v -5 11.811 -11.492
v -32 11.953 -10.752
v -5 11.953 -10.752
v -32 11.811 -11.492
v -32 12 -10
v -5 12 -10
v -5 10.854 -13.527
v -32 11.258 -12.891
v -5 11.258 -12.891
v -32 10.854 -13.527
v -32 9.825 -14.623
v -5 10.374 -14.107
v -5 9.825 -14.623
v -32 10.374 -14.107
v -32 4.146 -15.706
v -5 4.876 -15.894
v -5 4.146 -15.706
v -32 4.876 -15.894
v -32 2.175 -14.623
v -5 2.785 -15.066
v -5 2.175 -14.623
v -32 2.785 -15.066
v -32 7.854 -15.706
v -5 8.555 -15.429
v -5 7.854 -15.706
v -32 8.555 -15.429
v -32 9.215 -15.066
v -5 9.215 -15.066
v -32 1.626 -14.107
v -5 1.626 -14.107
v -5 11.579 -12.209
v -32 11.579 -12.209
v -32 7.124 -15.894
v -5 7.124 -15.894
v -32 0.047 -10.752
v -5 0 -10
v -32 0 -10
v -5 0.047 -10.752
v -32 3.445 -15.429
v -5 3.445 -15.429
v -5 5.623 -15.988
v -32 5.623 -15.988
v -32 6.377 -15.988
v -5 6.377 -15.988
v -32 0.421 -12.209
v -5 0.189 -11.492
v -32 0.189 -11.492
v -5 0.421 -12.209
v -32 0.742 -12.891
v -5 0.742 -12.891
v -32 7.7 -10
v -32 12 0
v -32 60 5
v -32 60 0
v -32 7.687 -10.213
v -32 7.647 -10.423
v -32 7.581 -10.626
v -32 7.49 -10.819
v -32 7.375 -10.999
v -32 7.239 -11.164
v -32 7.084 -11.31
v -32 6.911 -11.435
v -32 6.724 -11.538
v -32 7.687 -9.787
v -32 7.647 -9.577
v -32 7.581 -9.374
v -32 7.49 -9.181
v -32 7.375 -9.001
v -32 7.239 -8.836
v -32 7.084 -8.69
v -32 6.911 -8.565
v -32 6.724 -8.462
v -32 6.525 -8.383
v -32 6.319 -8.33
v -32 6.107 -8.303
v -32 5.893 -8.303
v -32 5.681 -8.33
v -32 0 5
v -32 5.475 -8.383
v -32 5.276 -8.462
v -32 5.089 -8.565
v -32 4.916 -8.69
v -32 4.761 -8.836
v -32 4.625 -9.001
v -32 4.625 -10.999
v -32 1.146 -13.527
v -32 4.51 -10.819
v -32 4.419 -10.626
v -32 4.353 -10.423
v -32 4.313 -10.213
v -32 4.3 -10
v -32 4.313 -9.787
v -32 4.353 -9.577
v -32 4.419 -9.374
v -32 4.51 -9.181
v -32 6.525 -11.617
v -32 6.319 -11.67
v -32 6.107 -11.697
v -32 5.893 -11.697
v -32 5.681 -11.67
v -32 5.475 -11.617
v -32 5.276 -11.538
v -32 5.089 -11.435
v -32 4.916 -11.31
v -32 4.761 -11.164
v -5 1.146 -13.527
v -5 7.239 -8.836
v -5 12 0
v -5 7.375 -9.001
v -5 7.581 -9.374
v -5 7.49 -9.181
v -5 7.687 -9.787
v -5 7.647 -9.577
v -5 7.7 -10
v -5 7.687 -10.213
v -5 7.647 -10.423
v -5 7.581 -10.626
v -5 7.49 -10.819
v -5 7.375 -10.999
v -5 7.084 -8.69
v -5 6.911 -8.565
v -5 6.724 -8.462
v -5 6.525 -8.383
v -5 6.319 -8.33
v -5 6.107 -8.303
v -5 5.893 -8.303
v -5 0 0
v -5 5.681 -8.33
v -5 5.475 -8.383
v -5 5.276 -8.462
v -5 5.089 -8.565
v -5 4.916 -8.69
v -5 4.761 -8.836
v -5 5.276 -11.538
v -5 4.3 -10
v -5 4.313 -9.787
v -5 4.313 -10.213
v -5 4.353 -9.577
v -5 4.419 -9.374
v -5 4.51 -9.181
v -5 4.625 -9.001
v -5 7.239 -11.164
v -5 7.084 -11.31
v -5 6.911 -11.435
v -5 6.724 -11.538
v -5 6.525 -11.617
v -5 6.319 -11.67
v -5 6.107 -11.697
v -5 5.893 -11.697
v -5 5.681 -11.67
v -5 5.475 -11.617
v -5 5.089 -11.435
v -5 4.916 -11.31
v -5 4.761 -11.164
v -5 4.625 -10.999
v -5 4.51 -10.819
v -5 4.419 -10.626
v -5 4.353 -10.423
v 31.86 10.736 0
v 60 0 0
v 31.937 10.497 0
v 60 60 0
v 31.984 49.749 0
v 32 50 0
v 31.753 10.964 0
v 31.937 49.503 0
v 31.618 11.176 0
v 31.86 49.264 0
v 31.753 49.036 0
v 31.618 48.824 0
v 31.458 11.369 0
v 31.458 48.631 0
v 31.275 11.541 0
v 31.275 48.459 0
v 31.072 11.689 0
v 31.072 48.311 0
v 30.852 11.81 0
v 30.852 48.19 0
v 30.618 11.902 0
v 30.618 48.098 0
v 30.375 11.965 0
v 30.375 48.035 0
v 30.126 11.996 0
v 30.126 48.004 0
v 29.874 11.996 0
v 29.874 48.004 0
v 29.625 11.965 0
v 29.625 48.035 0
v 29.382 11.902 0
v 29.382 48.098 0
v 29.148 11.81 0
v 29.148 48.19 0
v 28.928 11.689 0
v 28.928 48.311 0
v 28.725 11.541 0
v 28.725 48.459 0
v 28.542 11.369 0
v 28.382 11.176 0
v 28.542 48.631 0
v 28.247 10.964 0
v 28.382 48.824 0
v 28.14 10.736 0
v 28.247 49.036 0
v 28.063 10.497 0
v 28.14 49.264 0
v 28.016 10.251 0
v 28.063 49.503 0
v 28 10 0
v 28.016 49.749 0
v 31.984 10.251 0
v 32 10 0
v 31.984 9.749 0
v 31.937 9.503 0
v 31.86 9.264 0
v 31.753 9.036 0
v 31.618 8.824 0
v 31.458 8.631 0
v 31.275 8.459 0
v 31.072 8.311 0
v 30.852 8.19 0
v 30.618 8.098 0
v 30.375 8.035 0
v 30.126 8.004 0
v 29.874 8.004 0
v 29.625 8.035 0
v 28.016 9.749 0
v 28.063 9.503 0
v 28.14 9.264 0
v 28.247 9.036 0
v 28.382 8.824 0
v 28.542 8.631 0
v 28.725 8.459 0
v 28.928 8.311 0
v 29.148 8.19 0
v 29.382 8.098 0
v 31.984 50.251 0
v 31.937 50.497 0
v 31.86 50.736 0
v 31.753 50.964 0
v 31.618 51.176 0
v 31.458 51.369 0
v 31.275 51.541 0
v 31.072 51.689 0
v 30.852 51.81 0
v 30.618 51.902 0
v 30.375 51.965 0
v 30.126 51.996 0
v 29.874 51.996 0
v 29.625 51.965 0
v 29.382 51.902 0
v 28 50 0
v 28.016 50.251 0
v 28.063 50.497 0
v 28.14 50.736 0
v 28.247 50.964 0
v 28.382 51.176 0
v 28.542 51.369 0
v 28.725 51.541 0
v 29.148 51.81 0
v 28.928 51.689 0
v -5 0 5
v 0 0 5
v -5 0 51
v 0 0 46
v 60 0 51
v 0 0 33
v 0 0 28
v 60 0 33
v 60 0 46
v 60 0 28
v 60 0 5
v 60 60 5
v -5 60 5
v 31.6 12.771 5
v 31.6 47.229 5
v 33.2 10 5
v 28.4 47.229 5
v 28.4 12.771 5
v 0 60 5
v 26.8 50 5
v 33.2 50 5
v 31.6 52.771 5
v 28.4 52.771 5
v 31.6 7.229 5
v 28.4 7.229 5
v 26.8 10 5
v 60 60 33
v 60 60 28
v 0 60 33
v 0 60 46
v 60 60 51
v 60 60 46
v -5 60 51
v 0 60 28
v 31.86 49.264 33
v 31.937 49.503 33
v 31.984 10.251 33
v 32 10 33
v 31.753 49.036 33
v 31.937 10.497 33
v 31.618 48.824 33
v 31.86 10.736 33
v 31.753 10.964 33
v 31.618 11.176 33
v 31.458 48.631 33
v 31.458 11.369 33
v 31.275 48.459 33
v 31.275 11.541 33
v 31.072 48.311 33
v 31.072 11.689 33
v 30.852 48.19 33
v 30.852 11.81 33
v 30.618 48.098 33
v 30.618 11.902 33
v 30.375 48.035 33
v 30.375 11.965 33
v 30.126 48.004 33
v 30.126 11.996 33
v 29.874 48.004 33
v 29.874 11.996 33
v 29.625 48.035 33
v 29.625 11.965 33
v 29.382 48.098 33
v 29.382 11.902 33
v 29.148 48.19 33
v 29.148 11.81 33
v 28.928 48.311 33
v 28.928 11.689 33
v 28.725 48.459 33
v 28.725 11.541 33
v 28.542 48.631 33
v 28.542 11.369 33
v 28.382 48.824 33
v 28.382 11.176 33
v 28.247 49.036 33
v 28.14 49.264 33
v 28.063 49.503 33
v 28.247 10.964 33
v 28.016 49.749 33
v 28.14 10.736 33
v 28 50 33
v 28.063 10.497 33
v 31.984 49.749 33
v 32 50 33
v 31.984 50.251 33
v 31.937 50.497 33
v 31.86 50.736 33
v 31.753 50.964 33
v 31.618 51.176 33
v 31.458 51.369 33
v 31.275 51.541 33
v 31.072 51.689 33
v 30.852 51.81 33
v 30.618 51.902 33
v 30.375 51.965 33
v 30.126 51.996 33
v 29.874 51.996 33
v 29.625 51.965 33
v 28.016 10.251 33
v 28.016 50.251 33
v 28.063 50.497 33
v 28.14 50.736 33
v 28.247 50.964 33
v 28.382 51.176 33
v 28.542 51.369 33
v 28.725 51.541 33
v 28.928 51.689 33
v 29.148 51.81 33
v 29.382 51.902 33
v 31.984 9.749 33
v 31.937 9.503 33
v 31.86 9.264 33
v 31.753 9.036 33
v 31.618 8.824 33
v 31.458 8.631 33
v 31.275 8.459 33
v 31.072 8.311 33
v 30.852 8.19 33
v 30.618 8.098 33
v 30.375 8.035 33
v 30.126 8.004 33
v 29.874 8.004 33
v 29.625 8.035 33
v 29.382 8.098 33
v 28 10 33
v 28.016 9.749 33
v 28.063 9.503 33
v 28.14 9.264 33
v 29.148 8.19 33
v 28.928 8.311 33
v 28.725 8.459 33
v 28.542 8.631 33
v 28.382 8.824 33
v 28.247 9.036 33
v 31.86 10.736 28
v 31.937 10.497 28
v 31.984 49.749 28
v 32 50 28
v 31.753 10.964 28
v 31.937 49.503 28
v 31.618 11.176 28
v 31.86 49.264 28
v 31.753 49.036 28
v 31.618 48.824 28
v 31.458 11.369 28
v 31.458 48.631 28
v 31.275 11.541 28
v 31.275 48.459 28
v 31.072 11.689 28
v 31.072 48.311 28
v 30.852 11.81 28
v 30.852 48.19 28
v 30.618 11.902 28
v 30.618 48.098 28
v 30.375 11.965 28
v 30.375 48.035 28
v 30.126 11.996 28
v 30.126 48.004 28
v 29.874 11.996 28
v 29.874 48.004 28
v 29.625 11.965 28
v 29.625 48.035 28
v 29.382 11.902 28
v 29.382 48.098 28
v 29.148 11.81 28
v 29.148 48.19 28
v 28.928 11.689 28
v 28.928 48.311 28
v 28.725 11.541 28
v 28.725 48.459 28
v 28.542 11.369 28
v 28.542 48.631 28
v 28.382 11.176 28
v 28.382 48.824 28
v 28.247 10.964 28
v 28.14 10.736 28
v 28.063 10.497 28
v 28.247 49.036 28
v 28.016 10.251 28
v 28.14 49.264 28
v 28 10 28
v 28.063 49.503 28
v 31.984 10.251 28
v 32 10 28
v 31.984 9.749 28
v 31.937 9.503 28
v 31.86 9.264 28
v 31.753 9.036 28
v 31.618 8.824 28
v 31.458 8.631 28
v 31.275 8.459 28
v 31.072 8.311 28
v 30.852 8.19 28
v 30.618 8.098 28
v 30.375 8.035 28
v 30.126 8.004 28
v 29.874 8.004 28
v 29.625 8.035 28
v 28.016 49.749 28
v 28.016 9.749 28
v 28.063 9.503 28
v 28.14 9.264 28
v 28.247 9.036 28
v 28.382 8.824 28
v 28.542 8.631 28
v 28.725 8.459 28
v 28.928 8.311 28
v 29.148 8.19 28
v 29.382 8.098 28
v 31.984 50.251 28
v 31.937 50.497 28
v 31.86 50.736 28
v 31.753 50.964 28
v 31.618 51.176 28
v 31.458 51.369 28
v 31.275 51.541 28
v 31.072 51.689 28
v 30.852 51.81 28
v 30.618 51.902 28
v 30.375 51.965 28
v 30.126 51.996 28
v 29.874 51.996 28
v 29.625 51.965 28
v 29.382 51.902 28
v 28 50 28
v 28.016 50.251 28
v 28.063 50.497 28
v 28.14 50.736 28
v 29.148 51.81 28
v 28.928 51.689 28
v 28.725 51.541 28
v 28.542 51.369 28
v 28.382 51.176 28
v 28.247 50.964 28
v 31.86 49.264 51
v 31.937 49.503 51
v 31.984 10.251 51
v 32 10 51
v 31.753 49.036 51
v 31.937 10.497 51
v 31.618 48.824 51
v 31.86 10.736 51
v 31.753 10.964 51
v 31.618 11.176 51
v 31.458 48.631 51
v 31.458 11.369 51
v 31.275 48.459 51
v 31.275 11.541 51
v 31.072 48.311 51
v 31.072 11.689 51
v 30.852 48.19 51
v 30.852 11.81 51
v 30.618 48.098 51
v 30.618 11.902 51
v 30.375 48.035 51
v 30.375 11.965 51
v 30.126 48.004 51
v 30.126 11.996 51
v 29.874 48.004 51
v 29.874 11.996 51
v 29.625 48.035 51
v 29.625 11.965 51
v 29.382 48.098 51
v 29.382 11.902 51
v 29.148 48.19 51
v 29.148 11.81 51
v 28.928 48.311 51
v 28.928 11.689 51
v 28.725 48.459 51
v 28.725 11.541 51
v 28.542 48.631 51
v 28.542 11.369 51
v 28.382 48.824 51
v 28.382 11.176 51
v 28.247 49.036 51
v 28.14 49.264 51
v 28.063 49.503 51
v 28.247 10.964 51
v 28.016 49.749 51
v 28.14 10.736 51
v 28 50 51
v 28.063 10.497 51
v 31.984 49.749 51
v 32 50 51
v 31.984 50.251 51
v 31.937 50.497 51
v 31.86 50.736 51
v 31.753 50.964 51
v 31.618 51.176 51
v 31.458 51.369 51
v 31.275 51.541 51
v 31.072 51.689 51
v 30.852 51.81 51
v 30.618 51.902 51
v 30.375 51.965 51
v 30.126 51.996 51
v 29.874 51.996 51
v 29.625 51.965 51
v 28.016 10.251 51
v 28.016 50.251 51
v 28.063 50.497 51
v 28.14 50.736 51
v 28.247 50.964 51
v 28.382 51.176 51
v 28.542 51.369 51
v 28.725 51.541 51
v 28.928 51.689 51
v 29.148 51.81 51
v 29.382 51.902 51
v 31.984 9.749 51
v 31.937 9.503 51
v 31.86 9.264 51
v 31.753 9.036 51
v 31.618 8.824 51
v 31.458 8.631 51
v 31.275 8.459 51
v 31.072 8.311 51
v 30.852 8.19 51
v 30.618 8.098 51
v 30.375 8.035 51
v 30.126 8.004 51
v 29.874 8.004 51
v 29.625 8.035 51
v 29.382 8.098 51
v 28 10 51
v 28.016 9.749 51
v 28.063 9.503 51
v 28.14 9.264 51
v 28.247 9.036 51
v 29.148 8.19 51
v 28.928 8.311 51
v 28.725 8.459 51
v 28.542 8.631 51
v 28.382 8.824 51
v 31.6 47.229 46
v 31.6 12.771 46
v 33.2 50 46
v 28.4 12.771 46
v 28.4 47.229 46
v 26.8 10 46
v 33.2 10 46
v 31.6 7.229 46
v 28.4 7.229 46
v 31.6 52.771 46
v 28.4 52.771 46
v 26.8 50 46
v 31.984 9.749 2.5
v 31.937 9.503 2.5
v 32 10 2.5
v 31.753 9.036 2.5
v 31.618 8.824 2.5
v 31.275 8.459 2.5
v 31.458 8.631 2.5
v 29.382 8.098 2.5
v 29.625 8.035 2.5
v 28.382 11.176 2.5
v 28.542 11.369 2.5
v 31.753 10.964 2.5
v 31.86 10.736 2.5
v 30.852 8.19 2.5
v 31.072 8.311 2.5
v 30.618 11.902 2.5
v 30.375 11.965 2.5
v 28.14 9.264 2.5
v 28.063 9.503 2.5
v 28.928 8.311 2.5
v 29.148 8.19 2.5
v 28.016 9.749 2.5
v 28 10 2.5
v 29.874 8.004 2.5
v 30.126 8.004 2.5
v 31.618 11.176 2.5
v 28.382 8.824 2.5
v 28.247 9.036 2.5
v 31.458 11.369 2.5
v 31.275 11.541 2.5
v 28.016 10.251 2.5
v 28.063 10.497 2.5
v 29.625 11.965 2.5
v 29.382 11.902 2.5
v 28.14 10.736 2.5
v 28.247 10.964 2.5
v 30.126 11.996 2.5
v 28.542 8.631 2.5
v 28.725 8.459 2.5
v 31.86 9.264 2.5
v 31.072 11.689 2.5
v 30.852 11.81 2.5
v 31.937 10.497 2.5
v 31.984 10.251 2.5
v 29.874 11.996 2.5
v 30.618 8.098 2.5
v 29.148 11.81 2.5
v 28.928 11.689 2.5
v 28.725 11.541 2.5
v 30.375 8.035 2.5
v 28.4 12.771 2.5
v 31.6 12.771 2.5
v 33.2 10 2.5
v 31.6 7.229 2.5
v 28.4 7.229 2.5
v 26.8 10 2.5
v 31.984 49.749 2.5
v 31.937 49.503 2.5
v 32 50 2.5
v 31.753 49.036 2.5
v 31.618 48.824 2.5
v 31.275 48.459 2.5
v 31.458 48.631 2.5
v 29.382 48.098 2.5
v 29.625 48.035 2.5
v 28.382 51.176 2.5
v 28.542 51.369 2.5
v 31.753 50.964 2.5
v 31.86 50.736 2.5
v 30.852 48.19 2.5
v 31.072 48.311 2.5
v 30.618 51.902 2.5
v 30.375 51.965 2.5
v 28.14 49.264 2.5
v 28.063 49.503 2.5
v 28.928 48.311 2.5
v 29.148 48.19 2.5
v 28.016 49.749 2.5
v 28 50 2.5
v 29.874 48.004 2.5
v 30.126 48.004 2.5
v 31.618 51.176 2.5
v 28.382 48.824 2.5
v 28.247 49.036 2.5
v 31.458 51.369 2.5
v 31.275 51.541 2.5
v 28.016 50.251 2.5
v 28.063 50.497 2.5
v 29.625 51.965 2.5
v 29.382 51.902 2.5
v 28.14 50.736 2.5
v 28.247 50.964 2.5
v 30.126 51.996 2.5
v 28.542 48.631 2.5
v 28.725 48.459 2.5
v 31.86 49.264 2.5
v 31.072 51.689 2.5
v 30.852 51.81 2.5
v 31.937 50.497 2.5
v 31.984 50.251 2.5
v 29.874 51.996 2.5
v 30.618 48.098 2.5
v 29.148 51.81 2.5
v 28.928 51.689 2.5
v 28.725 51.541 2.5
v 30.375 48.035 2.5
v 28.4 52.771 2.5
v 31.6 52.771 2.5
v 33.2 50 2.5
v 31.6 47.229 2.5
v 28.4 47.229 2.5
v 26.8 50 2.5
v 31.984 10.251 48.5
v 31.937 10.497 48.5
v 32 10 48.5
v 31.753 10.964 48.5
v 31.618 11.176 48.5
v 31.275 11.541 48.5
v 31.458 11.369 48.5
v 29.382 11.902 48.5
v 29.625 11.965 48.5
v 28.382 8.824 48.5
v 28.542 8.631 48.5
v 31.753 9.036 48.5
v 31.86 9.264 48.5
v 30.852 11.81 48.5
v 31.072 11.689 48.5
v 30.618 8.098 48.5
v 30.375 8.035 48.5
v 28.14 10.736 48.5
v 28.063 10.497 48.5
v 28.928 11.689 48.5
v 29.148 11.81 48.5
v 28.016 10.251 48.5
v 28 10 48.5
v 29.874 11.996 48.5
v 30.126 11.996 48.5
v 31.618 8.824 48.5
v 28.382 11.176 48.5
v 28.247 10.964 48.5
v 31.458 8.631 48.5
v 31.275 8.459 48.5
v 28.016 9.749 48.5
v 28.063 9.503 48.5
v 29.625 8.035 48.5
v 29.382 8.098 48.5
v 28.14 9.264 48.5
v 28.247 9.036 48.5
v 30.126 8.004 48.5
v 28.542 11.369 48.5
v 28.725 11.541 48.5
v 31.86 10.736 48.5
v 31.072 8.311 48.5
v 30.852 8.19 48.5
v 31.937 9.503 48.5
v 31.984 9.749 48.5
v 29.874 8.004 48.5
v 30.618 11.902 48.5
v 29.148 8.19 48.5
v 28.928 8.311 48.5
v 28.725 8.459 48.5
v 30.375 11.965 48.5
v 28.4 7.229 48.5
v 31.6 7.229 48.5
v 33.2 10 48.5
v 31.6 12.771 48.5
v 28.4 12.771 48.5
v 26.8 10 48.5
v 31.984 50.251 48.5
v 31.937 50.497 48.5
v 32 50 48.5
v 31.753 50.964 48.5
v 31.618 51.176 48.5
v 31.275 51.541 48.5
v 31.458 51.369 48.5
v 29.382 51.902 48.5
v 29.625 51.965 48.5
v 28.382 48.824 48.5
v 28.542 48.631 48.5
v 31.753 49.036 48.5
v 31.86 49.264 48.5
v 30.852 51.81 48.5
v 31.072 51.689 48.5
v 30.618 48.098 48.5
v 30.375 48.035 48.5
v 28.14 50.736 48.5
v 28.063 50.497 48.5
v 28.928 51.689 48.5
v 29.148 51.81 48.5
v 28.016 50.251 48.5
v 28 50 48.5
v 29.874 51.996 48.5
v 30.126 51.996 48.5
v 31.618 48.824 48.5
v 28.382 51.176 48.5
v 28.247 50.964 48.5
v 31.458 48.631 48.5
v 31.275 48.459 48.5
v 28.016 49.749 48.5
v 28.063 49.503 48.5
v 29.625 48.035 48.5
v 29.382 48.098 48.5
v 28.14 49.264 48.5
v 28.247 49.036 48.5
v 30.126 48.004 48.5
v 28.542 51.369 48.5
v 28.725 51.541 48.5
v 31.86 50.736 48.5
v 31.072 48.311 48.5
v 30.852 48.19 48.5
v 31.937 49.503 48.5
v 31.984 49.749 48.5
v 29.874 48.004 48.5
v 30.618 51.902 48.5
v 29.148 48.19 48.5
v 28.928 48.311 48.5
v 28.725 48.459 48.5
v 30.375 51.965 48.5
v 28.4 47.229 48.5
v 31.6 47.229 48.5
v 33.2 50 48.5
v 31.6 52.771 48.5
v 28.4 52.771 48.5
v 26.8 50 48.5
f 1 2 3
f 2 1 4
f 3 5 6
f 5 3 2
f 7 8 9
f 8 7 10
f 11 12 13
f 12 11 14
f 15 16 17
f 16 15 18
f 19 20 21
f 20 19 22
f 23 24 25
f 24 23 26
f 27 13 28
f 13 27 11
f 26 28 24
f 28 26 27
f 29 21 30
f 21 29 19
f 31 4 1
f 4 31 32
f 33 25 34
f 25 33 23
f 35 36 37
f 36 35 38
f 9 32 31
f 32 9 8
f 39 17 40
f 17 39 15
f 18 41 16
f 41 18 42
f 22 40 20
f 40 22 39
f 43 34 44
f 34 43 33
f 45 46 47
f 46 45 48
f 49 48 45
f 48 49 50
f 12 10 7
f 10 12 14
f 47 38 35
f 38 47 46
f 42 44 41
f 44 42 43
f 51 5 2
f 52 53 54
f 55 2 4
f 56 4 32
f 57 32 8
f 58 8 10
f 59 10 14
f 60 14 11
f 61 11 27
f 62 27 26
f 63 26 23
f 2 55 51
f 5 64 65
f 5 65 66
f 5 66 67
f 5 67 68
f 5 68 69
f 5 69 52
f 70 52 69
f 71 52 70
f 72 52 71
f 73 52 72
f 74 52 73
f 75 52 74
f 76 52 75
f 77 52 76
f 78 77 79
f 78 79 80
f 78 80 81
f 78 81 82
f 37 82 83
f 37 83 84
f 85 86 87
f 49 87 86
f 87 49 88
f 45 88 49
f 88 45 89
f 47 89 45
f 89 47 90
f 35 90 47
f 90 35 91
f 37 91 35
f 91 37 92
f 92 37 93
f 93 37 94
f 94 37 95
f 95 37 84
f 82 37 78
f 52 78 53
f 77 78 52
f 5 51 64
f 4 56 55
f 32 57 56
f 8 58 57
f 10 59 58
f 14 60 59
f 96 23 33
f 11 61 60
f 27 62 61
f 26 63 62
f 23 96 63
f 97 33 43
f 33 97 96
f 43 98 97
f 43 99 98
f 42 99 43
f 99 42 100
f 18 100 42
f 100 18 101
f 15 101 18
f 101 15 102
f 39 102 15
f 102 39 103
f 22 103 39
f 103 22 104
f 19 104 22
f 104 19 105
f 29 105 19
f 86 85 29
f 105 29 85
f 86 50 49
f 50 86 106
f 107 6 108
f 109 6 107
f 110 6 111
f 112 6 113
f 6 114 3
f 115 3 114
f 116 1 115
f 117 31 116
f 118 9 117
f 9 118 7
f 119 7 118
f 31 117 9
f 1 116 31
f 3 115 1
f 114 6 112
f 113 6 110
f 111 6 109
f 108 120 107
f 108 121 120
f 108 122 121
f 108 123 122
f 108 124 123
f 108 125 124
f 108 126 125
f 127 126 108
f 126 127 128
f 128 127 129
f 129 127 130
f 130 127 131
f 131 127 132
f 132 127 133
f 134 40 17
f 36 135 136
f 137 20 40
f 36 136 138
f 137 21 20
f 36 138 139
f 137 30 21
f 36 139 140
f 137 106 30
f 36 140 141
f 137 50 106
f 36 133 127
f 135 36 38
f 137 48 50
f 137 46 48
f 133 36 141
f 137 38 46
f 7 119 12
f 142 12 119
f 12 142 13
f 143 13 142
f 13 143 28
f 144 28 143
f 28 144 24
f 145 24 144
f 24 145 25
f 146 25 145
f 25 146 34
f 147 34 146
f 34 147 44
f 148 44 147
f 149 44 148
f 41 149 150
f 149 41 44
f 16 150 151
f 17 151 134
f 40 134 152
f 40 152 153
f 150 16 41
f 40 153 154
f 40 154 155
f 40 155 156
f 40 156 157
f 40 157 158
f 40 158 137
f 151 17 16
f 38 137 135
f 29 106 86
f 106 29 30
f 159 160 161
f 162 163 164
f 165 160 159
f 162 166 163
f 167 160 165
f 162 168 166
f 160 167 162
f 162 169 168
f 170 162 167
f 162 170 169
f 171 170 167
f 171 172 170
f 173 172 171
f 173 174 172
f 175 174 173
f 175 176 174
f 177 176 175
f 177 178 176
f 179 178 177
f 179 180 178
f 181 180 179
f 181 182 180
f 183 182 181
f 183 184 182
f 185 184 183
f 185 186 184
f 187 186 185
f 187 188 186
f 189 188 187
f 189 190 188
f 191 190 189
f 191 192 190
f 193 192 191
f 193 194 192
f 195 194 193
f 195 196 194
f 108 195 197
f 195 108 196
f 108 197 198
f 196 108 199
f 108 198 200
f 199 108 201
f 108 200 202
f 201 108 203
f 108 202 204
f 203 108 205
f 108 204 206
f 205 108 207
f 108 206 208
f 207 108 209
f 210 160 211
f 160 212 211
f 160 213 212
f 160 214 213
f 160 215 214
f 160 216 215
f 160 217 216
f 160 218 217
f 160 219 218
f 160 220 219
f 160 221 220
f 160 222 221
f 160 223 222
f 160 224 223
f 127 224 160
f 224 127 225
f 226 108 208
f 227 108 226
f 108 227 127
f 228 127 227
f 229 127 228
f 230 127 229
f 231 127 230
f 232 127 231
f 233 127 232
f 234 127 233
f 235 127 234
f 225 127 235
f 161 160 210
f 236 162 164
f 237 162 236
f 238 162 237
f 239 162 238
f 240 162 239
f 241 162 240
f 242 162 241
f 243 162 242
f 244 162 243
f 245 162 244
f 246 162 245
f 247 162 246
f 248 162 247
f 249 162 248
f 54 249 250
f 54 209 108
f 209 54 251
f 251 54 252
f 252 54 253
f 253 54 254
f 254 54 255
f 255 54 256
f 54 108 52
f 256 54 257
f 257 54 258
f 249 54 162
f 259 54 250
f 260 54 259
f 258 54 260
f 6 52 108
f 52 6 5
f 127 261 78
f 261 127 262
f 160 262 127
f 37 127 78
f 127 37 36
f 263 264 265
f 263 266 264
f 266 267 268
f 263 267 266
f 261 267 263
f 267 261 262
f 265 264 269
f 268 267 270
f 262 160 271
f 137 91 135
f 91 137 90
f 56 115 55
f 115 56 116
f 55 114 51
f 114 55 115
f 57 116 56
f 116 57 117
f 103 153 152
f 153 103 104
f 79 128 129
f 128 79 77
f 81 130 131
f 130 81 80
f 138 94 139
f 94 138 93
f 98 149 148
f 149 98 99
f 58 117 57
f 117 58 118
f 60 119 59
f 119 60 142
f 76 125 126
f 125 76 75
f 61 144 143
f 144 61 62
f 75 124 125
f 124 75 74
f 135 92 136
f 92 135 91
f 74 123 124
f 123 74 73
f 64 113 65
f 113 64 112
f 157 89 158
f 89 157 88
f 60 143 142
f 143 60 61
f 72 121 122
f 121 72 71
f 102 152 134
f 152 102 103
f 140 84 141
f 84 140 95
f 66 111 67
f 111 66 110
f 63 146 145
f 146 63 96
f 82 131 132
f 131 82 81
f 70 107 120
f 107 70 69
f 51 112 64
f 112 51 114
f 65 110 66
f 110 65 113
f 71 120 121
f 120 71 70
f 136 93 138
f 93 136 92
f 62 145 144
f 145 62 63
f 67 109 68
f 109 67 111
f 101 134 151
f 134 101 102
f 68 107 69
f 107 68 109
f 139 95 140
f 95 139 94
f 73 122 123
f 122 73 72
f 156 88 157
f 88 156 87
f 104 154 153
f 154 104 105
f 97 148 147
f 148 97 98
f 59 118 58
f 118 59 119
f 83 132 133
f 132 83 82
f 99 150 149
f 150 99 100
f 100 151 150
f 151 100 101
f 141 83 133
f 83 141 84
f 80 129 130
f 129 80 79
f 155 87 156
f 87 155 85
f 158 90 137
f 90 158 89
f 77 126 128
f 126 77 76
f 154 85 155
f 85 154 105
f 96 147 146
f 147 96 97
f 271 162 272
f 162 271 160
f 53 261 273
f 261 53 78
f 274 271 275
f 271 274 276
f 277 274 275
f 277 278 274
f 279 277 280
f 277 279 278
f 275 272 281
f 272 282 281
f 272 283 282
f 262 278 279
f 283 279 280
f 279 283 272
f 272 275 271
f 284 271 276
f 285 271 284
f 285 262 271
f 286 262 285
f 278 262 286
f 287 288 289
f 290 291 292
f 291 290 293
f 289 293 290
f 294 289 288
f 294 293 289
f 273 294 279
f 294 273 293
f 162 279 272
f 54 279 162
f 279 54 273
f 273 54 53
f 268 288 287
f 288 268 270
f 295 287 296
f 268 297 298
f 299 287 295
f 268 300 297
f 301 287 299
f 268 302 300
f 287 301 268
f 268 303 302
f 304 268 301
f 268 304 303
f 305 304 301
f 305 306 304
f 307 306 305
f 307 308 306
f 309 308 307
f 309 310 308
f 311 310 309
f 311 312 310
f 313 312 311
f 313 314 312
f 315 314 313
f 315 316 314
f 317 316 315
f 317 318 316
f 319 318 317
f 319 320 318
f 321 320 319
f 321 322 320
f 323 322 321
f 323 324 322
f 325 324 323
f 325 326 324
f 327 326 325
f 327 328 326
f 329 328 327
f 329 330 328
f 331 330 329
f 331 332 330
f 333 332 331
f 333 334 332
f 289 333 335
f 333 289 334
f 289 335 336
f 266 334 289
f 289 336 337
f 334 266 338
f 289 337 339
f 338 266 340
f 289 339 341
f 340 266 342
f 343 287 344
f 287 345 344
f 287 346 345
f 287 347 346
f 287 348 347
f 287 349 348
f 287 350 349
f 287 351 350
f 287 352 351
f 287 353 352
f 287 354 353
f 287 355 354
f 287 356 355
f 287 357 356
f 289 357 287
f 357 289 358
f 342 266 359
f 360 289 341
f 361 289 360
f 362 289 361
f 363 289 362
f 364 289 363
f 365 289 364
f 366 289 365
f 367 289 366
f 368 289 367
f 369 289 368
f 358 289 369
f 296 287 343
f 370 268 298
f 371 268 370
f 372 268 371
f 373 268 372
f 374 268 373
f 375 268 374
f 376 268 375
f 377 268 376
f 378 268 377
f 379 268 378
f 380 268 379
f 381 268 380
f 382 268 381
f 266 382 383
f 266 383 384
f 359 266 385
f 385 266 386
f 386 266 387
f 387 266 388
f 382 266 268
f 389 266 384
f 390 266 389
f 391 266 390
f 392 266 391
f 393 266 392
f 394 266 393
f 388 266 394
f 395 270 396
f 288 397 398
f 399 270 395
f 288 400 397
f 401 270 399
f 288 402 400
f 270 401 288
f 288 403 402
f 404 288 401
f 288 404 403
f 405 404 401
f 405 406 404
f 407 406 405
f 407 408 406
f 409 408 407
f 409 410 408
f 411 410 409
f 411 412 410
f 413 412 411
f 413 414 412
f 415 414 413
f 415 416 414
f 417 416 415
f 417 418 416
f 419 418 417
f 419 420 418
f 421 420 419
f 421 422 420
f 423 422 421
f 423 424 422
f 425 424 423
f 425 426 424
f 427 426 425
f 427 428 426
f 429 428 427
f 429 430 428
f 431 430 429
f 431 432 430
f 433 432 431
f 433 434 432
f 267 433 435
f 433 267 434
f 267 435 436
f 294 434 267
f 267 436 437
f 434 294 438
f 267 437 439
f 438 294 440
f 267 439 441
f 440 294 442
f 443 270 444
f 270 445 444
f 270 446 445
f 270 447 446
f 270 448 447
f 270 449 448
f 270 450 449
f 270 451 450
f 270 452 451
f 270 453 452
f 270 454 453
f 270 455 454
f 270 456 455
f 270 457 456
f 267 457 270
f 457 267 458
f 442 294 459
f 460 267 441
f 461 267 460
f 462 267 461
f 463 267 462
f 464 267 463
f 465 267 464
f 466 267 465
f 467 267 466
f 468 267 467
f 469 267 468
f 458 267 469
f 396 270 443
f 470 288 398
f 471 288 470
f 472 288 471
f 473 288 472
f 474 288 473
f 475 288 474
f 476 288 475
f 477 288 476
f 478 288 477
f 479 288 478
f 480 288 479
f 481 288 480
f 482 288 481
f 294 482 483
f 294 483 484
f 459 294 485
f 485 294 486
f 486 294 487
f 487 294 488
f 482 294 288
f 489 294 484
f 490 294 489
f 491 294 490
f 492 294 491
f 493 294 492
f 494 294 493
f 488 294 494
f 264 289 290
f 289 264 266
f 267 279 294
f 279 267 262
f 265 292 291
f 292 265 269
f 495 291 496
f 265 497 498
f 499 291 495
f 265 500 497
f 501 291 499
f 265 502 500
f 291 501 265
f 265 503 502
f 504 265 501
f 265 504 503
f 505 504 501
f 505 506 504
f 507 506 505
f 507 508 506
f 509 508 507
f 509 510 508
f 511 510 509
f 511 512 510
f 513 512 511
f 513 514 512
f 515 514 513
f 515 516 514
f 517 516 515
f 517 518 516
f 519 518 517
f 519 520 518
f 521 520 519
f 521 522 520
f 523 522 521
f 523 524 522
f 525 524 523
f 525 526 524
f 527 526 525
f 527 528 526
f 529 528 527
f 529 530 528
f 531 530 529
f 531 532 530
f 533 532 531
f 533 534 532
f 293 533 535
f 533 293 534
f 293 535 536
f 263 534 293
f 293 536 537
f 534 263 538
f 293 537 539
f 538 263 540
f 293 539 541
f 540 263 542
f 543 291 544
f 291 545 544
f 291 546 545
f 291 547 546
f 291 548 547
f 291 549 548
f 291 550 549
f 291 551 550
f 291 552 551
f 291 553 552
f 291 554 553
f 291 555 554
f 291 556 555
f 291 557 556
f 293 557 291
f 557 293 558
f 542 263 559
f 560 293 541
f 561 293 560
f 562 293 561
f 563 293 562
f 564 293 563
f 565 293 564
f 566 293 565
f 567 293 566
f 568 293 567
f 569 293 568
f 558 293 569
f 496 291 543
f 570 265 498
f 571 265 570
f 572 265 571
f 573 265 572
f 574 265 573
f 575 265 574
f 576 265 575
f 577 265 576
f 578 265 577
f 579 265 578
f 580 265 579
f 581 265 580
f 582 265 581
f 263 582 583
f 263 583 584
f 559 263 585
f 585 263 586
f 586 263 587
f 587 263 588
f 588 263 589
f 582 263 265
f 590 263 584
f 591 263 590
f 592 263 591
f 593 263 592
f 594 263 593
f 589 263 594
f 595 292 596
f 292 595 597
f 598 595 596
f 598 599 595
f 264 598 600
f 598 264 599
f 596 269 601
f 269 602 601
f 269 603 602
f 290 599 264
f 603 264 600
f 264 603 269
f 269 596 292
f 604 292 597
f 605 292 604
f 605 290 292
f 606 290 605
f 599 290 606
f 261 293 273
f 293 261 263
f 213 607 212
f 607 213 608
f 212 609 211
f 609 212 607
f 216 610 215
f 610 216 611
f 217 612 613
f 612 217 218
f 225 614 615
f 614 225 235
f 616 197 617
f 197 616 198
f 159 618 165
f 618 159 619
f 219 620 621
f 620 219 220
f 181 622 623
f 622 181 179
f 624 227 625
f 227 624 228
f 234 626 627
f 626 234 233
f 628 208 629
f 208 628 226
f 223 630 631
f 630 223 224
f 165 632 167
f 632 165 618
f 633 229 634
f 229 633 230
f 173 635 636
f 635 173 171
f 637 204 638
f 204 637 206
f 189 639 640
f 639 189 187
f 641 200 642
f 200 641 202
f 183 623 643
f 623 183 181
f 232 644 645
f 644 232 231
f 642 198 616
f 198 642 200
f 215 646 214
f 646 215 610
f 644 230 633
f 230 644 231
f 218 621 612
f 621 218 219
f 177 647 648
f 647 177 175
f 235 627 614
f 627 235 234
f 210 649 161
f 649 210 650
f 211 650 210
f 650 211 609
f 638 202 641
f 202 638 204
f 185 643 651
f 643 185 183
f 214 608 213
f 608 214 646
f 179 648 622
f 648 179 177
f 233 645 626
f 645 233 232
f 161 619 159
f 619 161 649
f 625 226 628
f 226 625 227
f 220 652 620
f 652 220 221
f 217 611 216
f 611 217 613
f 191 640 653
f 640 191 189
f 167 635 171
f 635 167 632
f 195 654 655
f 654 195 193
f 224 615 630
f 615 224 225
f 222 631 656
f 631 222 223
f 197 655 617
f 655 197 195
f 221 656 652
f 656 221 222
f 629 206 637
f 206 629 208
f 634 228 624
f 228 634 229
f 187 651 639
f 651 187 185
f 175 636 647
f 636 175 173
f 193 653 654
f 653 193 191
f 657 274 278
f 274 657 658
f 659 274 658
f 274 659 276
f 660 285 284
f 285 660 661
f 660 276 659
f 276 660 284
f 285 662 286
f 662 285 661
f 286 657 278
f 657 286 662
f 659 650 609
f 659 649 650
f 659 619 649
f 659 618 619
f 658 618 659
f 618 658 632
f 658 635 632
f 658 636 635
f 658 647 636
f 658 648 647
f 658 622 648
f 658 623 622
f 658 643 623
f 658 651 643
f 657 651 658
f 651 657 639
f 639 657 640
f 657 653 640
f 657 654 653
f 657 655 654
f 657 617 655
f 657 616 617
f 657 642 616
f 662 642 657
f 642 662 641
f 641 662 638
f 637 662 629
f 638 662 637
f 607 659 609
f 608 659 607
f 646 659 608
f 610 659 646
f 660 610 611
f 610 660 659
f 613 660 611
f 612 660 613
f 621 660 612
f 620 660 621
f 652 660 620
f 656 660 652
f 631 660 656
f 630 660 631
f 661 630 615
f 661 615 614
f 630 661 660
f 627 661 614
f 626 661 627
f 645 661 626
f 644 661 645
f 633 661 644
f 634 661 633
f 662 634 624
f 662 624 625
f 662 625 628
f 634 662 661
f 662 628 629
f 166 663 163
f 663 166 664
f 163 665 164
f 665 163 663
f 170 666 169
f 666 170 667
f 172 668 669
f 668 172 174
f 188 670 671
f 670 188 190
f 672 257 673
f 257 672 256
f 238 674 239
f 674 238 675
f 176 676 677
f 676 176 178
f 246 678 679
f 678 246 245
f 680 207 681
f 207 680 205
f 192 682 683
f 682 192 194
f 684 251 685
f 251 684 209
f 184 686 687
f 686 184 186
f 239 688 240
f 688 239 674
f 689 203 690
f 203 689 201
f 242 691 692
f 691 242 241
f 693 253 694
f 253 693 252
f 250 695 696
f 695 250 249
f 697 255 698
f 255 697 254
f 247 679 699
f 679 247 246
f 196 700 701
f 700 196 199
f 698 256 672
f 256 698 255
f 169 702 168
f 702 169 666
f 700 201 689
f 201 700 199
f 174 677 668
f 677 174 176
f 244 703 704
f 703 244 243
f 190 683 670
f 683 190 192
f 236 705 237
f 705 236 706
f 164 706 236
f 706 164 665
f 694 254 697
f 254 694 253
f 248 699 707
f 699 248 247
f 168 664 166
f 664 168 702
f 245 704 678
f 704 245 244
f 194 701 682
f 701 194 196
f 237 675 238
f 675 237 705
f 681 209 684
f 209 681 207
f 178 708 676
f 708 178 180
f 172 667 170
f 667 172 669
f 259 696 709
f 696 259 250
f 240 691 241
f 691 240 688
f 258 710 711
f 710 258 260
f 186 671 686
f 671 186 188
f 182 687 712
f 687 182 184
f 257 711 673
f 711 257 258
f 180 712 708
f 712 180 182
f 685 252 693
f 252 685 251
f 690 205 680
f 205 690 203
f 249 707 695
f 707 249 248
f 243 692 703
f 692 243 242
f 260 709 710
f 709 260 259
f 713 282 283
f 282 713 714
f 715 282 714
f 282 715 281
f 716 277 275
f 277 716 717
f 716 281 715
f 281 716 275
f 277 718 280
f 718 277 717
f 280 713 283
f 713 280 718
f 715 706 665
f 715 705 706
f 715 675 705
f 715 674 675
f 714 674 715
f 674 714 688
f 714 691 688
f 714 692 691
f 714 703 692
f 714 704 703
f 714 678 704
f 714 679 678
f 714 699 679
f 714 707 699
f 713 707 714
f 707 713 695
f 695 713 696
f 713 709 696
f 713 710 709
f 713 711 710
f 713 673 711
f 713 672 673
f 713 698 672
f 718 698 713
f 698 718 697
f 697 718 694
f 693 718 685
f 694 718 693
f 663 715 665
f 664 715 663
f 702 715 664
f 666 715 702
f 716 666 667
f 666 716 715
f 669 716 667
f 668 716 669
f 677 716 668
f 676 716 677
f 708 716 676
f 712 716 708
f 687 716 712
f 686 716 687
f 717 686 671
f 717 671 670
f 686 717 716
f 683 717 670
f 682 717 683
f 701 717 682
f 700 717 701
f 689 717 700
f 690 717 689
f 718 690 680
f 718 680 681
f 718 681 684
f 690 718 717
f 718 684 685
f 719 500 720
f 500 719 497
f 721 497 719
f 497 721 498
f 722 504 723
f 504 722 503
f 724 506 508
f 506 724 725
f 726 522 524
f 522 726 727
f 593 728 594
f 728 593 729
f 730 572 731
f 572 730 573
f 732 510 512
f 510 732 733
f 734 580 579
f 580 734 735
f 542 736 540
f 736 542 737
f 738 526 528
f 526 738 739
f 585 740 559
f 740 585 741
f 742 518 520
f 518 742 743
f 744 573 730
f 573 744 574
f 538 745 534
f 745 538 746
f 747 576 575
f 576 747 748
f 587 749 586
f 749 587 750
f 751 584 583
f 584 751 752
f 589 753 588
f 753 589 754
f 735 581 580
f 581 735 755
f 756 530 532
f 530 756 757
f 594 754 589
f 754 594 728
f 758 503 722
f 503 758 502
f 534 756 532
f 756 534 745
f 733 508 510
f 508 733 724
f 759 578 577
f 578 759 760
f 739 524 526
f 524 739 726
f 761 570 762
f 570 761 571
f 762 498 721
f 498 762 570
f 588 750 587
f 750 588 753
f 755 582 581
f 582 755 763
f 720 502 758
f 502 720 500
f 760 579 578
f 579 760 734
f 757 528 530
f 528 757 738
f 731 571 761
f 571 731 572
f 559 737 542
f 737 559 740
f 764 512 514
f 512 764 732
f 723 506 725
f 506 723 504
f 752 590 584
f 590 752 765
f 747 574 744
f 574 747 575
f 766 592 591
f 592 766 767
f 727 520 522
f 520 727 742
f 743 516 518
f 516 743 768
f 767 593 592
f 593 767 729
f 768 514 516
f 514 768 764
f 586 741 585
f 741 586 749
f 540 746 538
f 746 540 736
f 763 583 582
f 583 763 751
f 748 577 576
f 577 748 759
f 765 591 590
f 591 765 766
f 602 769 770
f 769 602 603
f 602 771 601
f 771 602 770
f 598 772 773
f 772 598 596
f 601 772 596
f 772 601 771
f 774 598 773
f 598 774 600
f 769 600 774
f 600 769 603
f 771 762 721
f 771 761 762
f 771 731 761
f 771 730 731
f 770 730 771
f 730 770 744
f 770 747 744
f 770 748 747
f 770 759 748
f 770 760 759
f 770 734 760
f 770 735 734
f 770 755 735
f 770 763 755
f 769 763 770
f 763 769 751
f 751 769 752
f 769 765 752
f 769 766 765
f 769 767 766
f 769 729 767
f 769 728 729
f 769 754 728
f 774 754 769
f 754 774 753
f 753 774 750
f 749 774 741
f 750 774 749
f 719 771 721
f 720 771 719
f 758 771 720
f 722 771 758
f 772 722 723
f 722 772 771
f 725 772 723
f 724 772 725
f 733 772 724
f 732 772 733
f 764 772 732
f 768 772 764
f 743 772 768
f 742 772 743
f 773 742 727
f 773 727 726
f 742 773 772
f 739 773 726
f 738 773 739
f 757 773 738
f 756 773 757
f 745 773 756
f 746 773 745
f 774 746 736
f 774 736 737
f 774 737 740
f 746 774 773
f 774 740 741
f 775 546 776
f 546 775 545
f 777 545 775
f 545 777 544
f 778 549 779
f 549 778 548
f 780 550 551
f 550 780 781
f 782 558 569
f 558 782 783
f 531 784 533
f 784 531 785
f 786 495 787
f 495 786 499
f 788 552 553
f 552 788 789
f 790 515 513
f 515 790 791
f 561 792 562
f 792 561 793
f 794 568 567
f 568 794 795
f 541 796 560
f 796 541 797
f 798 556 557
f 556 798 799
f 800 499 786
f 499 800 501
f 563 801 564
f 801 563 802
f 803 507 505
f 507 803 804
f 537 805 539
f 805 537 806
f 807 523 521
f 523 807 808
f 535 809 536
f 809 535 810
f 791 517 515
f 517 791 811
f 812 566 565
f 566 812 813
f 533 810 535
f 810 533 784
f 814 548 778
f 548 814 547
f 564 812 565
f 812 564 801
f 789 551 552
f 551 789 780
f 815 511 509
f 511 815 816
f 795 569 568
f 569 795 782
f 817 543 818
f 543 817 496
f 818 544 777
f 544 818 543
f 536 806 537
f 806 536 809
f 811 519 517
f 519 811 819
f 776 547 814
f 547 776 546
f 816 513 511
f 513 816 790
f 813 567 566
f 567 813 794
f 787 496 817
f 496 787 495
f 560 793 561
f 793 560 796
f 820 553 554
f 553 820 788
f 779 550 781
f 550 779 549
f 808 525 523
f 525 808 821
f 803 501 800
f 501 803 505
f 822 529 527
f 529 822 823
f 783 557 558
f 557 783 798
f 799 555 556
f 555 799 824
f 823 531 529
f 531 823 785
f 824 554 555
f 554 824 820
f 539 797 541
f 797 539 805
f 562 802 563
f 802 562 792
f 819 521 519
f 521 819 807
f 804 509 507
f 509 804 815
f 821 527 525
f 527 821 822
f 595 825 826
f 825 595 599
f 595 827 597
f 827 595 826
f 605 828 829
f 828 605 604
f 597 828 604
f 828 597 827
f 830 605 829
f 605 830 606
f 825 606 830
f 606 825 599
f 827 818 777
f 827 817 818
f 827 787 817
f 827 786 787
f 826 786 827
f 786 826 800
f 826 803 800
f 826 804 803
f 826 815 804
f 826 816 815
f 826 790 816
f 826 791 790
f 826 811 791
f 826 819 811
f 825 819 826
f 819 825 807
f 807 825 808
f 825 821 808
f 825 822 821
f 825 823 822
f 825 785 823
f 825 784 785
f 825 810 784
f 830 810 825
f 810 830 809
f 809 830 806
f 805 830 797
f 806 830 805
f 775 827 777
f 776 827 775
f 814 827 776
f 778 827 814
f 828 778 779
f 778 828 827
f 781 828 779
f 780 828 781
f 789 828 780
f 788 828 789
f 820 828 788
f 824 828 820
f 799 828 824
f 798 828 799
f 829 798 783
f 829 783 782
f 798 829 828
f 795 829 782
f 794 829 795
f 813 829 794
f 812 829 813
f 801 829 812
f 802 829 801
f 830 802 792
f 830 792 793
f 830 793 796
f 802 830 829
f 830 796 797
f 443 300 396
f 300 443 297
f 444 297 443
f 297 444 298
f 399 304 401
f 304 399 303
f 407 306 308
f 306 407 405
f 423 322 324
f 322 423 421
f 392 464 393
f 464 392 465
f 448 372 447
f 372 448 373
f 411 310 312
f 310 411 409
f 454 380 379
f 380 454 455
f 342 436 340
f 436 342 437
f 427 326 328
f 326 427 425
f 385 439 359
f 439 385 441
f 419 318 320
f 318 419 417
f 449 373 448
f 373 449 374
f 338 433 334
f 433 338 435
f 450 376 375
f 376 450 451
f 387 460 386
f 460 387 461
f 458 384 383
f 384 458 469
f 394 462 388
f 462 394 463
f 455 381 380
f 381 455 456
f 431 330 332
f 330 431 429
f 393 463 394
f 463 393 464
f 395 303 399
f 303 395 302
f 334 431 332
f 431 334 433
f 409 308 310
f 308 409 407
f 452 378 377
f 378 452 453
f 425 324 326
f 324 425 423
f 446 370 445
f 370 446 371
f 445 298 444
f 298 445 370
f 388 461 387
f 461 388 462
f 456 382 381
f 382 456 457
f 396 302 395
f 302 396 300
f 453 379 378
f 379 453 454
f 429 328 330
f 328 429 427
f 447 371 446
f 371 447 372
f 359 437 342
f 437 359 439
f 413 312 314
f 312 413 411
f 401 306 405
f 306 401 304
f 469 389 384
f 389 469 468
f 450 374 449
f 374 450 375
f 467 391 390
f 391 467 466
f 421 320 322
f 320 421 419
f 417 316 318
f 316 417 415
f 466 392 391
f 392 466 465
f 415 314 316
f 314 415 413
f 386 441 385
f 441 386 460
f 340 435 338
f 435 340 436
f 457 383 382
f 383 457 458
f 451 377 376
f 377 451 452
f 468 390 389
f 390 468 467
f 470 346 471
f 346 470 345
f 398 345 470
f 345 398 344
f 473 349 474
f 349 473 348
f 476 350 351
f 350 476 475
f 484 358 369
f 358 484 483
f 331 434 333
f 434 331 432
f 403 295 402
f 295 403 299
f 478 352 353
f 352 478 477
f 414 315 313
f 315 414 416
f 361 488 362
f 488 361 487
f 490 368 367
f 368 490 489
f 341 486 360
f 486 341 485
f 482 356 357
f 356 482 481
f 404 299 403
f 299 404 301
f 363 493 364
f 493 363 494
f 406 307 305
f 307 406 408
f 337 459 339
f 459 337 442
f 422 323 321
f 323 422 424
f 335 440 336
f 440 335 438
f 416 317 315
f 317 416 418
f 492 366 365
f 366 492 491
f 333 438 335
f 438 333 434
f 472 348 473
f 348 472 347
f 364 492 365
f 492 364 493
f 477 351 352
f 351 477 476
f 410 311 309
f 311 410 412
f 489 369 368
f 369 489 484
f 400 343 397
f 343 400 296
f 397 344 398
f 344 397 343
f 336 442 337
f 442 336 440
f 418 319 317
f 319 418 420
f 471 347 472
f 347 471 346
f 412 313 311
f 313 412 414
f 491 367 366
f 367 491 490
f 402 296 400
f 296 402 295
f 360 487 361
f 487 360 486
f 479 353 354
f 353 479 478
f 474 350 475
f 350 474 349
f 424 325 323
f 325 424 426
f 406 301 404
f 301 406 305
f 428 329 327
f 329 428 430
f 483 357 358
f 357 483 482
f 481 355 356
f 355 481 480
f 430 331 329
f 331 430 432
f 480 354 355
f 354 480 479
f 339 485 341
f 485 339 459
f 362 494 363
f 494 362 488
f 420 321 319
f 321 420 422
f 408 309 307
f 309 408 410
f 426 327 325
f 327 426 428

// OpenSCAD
$fn=50;
ecrou_m3=3.2;
ep=5;
trou_m3=2;
raspSize = [105, 80,14.5+2];

module ecrou(){
	translate([0,0,ep])rotate([180,0,0]) union(){
		translate([0,0,-ep/2])cylinder(h=ep+10, r=trou_m3);
		translate([0,0,-ep/2])cylinder(h=ep, r=ecrou_m3, $fn=6);
	}
}

translate([-5,6,-10])rotate([-90, 0, 90])difference(){
	union(){
		cylinder(r=6, h=raspSize[2]*2-6, $fn=50);
		translate([-6, 0, 0]) rotate([0, 0, -90])
			cube([10, 6*2,raspSize[2]*2-6]);
	}
	translate([0,0,-1])cylinder(r=1.7, h=raspSize[2]*2-6+2);
}

difference(){
	union(){
		translate([-(raspSize[2]*2-6+5),0,0]) cube([60+raspSize[2]*2-6+5,60,5]);
		translate([0,0,23+5]) cube([60,60,5]);
		translate([0,0,13+5+23+5]) cube([60,60,5]);
		translate([-5,0,0]) cube([5,60, 13+5+23+5+5]);
	}

	union(){
		translate([30,10,0]) ecrou();
		translate([30,60-10,0]) ecrou();
		translate([30,10,13+5+23+10]) rotate([180,0,0]) ecrou();
		translate([30,60-10,13+5+23+10])rotate([180,0,0]) ecrou();
		translate([30,10,5+23]) rotate([180,0,0]) ecrou();
		translate([30,60-10,5+23]) rotate([180,0,0]) ecrou();
	}
}
